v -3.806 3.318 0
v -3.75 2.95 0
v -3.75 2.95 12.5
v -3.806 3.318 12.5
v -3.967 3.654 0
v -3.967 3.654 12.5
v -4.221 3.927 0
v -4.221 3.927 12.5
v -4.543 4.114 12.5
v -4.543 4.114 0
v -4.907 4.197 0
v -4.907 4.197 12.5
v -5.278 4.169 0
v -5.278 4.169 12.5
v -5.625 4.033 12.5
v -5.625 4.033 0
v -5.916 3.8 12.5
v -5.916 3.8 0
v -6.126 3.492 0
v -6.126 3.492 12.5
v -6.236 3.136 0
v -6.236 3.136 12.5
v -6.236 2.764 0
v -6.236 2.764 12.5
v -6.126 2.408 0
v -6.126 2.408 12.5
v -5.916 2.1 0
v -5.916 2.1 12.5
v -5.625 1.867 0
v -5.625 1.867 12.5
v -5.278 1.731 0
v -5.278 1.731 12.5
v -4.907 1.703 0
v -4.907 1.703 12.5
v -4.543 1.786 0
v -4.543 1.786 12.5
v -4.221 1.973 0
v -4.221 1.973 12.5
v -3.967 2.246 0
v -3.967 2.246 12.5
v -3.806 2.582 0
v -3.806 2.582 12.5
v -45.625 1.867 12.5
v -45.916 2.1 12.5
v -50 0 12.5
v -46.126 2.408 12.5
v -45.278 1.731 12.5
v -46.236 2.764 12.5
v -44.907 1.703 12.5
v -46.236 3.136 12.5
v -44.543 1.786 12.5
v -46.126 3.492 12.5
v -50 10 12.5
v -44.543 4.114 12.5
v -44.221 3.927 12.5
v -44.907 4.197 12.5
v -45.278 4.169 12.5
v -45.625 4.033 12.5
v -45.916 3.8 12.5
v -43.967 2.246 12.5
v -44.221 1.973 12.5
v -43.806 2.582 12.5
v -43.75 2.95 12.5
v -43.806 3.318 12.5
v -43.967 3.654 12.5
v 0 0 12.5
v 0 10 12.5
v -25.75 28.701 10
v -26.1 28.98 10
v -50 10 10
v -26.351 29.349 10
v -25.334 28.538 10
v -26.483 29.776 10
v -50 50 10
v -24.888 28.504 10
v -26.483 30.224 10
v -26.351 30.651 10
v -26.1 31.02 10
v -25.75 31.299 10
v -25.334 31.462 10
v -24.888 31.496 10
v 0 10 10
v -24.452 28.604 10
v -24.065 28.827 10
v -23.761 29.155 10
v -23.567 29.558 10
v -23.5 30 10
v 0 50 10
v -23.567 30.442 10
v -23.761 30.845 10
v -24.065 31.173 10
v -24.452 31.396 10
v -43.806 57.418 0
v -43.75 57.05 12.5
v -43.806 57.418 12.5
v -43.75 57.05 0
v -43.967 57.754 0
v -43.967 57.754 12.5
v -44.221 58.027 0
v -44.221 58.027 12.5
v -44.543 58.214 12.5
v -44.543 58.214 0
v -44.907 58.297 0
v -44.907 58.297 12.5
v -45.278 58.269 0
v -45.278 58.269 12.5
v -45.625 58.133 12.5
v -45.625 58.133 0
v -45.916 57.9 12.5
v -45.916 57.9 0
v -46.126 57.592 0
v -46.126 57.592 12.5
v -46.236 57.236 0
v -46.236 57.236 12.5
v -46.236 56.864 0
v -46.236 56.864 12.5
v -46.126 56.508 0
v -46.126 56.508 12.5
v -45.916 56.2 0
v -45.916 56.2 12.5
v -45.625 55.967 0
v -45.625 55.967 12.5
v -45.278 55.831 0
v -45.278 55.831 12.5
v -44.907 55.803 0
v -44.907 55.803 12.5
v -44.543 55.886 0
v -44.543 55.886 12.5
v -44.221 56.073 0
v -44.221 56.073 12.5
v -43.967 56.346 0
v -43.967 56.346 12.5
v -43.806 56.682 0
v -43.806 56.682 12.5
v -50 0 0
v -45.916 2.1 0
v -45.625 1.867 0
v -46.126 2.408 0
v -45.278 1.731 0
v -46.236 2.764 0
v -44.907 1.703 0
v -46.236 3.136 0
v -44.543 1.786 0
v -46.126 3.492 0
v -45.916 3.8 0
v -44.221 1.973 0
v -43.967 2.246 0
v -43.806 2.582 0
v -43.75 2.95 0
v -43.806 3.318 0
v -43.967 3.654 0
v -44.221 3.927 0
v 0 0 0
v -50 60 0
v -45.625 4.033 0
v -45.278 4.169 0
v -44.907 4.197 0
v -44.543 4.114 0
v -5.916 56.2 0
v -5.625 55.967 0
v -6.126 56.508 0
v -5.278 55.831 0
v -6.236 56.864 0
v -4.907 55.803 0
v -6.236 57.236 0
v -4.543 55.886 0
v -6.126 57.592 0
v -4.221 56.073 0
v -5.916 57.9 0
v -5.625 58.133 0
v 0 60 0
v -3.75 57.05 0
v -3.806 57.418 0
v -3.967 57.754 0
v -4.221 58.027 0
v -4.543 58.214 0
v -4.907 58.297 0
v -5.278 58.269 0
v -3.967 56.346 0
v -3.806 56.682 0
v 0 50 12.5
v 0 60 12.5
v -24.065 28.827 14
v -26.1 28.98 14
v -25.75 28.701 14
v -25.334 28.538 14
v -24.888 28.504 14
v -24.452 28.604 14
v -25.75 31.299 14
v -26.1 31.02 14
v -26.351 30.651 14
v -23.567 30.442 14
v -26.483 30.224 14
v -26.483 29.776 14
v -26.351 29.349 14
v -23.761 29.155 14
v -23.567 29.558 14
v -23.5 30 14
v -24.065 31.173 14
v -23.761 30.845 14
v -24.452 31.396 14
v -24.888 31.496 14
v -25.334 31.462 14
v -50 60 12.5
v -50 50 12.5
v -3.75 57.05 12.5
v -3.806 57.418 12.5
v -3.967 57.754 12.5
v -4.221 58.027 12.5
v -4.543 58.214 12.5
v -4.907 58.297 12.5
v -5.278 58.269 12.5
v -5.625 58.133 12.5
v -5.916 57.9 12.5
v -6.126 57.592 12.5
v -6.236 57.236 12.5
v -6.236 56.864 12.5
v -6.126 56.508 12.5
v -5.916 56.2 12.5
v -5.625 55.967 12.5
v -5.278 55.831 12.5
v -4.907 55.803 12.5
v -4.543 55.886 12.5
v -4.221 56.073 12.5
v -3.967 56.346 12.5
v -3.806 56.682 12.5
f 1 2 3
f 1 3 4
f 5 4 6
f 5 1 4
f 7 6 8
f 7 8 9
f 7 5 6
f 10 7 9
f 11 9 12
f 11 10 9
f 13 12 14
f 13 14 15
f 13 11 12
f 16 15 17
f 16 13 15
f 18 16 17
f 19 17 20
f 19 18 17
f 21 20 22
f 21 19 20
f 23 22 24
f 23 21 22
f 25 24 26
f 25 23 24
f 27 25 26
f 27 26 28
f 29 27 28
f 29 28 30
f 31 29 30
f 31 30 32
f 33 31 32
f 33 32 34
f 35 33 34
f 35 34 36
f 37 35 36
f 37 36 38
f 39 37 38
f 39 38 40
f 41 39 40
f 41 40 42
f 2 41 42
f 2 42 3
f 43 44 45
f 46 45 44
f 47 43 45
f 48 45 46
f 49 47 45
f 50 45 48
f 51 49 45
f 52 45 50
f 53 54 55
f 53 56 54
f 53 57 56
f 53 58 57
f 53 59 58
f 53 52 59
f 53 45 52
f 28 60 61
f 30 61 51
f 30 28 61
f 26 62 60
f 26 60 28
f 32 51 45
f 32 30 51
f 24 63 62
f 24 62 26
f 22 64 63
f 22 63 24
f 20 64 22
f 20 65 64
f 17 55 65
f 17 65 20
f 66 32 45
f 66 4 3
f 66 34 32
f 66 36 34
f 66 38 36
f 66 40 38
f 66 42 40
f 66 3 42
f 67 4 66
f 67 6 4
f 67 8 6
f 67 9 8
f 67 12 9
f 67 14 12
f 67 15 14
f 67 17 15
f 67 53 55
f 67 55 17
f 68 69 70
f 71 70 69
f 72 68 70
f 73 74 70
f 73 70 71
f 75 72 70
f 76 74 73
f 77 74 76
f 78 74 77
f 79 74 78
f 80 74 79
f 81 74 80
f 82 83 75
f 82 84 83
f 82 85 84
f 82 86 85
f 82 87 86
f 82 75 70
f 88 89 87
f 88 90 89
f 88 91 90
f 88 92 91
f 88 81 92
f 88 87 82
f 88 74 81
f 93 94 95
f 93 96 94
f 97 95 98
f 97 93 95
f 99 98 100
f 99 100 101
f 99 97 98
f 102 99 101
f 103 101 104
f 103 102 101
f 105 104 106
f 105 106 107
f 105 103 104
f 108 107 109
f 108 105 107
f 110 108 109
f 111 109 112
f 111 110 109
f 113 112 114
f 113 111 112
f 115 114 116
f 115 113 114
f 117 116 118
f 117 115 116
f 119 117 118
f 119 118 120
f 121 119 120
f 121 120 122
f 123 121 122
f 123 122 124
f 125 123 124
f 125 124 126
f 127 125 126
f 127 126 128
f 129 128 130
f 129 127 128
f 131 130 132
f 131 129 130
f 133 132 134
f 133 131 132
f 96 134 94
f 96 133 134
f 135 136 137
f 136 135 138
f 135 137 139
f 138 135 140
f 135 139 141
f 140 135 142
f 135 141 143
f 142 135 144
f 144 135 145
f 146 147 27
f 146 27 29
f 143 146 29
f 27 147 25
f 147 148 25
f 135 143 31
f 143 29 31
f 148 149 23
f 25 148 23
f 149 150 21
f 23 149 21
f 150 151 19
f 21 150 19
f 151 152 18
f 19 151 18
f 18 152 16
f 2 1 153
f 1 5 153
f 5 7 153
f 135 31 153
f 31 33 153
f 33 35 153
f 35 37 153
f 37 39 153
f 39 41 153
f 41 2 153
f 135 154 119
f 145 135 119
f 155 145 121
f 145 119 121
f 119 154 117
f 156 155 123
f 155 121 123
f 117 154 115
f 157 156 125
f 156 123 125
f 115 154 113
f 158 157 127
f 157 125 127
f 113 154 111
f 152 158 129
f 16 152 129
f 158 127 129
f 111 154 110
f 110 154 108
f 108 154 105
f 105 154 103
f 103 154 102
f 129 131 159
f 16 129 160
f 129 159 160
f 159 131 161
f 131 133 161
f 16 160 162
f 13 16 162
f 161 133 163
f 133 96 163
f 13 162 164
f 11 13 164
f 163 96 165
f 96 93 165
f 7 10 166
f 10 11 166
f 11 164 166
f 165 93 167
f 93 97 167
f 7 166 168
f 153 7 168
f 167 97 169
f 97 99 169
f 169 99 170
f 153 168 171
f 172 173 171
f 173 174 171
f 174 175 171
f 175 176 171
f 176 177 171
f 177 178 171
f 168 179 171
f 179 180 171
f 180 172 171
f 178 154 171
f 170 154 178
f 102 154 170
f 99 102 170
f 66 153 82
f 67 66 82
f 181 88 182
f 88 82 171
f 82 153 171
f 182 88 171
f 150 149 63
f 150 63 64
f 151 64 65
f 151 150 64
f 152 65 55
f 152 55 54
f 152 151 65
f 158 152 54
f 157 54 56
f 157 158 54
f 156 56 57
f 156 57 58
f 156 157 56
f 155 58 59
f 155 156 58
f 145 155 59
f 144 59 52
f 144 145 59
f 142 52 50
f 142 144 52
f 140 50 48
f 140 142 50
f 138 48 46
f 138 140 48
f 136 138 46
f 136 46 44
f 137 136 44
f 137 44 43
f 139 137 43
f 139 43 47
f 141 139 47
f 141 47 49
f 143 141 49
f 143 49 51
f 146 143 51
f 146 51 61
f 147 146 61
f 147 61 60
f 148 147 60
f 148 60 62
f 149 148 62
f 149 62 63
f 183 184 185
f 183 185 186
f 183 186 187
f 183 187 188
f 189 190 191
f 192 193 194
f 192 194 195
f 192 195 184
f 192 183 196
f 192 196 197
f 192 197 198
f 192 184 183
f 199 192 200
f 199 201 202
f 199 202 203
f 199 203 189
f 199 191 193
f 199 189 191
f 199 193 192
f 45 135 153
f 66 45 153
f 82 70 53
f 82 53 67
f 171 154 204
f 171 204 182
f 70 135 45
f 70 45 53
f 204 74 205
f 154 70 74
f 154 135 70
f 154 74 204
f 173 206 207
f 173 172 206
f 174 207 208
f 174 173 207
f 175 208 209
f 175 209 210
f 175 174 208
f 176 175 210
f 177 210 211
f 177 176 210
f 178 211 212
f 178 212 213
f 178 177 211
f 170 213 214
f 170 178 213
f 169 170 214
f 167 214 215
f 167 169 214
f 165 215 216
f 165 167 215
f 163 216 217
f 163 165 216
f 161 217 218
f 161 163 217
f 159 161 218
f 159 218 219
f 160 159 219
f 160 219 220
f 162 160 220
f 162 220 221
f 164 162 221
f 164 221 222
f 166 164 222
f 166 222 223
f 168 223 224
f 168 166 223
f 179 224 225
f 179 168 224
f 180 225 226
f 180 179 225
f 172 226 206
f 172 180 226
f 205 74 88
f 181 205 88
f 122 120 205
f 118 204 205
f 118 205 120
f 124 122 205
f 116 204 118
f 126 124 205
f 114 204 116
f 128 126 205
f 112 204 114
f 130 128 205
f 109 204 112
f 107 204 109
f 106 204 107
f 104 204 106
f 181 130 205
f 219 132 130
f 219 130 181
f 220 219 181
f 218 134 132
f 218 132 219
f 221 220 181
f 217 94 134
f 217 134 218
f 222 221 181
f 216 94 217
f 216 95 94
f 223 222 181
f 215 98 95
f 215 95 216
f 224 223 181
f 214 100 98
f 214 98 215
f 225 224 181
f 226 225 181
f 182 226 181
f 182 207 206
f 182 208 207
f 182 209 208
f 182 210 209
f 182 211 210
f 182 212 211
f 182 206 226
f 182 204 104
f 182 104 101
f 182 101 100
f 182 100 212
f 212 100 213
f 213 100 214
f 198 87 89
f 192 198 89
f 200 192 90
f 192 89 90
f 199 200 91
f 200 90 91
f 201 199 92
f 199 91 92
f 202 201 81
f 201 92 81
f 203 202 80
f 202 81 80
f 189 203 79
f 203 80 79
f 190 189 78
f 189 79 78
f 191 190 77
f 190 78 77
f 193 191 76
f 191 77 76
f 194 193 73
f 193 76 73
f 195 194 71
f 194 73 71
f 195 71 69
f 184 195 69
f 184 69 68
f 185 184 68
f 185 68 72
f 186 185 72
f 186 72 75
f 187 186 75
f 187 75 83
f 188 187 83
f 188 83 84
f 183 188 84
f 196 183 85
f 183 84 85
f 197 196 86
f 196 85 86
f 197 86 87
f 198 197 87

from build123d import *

# Parameters (mm, degrees)
SKIZZE1_W                       = 50
SKIZZE1_H                       = 60
SKIZZE1_R                       = 1.25
AUFSATZ_LINEAR_AUSTRAGEN1_DEPTH = 10
SKIZZE2_R                       = 1.5
AUFSATZ_LINEAR_AUSTRAGEN2_DEPTH = 4
SKIZZE3_W                       = 50
SKIZZE3_H                       = 10
SKIZZE3_R                       = 1.25
AUFSATZ_LINEAR_AUSTRAGEN3_DEPTH = 2.5


with BuildPart() as part:
    # Skizze1 → Aufsatz-Linear austragen1 (new body)
    with BuildSketch(Plane.XY):
        with Locations((-25, 30)):
            Rectangle(SKIZZE1_W, SKIZZE1_H)
        with Locations((-45, 57.05)):
            Circle(SKIZZE1_R, mode=Mode.SUBTRACT)
        with Locations((-5, 57.05)):
            Circle(SKIZZE1_R, mode=Mode.SUBTRACT)
        with Locations((-45, 2.95)):
            Circle(SKIZZE1_R, mode=Mode.SUBTRACT)
        with Locations((-5, 2.95)):
            Circle(SKIZZE1_R, mode=Mode.SUBTRACT)
    extrude(amount=AUFSATZ_LINEAR_AUSTRAGEN1_DEPTH)

    # Skizze2 → Aufsatz-Linear austragen2 (add)
    with BuildSketch(Plane.XY.offset(10)):
        with Locations((-25, 30)):
            Circle(SKIZZE2_R)
    extrude(amount=AUFSATZ_LINEAR_AUSTRAGEN2_DEPTH)

    # Skizze3 → Aufsatz-Linear austragen3 (add)
    with BuildSketch(Plane.XY.offset(10)):
        with Locations((-25, 55)):
            Rectangle(SKIZZE3_W, SKIZZE3_H)
        with Locations((-45, 57.05)):
            Circle(SKIZZE3_R, mode=Mode.SUBTRACT)
        with Locations((-5, 57.05)):
            Circle(SKIZZE3_R, mode=Mode.SUBTRACT)
        with Locations((-25, 5)):
            Rectangle(SKIZZE3_W, SKIZZE3_H)
        with Locations((-45, 2.95)):
            Circle(SKIZZE3_R, mode=Mode.SUBTRACT)
        with Locations((-5, 2.95)):
            Circle(SKIZZE3_R, mode=Mode.SUBTRACT)
    extrude(amount=AUFSATZ_LINEAR_AUSTRAGEN3_DEPTH)


solid = part.part
